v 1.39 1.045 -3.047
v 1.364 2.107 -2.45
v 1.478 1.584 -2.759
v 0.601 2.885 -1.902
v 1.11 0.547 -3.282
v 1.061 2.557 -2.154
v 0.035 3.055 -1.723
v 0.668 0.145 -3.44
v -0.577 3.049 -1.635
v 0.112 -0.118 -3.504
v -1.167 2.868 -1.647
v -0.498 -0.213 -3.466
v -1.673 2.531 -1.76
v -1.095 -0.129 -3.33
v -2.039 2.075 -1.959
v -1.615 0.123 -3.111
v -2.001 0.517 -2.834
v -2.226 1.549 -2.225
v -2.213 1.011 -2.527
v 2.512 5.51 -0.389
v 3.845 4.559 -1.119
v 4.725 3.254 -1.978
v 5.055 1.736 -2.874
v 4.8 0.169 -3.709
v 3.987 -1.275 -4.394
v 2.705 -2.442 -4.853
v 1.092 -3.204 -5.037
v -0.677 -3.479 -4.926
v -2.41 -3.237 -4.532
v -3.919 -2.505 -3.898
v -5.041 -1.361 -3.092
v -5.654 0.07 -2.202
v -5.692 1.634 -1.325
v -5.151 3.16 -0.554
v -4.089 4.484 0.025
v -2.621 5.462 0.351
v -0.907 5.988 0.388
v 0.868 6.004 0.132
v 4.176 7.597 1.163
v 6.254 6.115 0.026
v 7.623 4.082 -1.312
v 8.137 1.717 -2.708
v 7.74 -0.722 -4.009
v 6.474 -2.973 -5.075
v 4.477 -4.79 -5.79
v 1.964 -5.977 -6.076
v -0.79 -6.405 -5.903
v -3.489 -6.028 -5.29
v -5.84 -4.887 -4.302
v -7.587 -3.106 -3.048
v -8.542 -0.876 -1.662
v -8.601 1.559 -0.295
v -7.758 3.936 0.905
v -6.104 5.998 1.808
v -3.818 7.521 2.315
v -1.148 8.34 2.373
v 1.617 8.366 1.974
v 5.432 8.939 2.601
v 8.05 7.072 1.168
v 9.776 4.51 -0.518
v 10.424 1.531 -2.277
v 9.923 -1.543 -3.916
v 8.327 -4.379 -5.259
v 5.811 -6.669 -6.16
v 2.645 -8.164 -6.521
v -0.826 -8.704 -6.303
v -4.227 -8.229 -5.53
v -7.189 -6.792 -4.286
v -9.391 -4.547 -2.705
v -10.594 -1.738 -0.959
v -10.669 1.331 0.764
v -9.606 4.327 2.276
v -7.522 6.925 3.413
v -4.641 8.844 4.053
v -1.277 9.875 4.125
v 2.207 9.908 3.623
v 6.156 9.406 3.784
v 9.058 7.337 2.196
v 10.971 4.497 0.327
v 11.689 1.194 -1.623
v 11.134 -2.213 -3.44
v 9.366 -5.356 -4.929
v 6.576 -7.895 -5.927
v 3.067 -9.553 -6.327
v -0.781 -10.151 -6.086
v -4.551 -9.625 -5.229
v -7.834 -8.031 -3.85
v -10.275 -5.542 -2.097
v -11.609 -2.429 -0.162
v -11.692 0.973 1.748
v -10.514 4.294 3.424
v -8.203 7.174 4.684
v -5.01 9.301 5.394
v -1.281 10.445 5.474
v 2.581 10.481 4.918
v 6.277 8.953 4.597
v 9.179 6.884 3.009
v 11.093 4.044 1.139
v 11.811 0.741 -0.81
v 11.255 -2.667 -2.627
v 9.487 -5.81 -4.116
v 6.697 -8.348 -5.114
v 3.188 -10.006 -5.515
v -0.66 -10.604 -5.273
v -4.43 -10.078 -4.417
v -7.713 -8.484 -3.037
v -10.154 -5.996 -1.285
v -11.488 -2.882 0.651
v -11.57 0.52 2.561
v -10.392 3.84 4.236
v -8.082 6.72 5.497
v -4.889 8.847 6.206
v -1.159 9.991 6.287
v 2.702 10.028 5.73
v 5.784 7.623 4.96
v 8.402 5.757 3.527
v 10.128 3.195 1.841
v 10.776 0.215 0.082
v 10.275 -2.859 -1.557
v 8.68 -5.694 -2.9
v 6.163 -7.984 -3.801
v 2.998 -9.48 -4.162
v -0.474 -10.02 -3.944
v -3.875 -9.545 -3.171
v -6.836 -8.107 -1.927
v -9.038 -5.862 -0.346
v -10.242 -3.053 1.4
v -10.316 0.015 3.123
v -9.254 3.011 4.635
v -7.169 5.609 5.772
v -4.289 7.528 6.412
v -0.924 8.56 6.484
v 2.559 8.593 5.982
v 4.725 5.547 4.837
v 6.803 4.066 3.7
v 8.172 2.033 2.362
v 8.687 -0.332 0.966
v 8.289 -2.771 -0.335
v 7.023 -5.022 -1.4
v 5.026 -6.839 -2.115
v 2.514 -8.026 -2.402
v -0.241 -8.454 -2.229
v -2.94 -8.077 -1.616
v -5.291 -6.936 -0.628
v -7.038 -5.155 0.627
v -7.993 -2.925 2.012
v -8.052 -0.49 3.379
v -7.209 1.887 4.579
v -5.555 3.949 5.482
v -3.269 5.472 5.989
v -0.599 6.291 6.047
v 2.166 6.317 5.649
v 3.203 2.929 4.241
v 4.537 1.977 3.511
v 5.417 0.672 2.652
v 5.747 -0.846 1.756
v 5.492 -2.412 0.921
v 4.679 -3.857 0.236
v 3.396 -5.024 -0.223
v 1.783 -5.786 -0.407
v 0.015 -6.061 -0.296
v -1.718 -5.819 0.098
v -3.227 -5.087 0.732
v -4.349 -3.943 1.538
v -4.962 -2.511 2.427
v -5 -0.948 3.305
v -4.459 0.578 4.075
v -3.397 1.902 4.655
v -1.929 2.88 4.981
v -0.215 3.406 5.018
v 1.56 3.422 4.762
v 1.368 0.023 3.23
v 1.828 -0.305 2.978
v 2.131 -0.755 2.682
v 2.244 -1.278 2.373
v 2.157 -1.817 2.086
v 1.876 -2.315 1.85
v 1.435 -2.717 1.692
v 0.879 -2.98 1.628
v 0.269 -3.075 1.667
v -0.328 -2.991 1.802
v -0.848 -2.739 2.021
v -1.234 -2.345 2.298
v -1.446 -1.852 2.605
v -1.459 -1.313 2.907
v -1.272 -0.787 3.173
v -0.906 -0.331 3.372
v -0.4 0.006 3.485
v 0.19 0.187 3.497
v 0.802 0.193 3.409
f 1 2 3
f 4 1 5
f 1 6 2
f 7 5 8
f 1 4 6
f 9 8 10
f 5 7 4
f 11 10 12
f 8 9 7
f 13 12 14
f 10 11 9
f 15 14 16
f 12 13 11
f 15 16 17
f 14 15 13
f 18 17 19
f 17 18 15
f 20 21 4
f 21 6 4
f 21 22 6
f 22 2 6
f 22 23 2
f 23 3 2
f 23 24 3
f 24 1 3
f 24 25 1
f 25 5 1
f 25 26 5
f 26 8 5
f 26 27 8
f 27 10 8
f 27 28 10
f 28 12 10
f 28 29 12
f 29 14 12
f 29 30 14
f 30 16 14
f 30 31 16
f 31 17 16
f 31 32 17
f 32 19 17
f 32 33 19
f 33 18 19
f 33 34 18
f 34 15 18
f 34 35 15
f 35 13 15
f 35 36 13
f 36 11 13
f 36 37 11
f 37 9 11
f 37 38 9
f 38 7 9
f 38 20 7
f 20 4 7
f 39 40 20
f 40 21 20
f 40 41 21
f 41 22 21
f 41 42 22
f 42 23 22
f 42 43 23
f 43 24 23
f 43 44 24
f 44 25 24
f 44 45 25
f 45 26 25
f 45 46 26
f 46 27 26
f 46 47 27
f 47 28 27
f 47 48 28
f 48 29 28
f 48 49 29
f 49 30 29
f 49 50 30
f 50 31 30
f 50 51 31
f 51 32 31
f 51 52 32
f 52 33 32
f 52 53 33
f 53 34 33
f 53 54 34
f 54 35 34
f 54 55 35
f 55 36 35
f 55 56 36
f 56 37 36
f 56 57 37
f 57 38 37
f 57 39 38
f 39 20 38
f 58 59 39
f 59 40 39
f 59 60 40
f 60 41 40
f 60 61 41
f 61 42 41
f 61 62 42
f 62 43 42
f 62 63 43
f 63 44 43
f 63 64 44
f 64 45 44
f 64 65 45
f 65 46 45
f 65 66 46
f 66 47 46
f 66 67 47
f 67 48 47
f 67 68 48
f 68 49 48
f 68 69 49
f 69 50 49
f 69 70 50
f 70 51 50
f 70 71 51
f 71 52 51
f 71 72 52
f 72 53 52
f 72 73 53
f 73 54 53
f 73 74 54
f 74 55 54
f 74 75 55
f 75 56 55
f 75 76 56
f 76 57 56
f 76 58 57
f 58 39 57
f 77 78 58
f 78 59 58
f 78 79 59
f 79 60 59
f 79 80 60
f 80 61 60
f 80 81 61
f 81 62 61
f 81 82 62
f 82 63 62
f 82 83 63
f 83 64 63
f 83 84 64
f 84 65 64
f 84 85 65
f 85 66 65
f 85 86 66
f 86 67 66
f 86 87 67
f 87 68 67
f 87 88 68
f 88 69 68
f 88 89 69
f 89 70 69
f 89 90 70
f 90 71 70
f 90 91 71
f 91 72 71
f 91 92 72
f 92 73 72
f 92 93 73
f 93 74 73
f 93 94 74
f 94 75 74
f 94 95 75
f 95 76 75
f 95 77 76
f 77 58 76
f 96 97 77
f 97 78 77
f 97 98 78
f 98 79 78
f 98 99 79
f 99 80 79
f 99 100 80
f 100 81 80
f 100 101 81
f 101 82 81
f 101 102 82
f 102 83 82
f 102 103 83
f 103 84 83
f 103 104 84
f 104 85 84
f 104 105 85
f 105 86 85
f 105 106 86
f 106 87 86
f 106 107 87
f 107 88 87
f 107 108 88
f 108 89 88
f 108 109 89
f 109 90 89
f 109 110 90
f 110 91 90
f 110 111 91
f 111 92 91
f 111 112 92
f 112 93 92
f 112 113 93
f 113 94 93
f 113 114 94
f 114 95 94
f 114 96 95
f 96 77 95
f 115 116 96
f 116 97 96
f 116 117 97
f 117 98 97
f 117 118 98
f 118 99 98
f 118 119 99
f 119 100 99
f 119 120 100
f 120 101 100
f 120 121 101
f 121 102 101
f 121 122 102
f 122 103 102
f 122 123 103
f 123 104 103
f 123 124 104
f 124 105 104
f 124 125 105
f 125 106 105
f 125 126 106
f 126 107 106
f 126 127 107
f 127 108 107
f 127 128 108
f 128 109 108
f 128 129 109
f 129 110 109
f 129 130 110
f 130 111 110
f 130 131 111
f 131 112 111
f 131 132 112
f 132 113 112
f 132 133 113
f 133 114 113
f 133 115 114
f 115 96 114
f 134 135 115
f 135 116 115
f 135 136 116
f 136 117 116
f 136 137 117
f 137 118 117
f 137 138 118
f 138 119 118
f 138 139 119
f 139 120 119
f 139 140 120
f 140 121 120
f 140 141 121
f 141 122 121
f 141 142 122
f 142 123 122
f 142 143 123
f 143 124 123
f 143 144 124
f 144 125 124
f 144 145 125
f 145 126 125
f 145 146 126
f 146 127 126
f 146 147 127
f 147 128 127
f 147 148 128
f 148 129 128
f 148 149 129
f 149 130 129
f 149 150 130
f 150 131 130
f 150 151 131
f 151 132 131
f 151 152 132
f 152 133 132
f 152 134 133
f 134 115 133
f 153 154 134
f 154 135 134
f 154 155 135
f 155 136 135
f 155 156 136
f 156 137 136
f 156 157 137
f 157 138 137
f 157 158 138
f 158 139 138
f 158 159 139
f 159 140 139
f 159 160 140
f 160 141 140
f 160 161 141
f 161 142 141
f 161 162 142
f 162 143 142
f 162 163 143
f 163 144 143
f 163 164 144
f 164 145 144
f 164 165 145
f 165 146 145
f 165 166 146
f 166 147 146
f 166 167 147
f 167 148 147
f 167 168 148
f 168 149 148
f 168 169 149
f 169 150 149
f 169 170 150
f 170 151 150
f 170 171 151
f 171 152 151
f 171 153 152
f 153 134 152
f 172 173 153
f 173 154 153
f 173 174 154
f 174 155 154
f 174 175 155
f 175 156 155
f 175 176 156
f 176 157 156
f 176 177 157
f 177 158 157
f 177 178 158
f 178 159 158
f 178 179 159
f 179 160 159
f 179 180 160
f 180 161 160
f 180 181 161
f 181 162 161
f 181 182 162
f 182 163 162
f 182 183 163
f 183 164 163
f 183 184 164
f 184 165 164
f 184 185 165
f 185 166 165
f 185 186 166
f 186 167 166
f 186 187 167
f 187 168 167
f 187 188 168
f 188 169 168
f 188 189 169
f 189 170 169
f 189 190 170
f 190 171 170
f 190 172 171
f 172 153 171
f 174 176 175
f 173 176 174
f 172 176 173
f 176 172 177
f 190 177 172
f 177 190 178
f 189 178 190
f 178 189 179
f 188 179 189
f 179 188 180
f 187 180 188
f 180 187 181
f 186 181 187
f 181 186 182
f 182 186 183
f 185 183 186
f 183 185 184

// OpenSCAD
// Generated by generate_scads.py
rotate([30,0,15]) {
  rotate([180,0,45]) {
    scale([2.0,2.0,0.5]) {
      sphere(r=6);
    }
  }
}
